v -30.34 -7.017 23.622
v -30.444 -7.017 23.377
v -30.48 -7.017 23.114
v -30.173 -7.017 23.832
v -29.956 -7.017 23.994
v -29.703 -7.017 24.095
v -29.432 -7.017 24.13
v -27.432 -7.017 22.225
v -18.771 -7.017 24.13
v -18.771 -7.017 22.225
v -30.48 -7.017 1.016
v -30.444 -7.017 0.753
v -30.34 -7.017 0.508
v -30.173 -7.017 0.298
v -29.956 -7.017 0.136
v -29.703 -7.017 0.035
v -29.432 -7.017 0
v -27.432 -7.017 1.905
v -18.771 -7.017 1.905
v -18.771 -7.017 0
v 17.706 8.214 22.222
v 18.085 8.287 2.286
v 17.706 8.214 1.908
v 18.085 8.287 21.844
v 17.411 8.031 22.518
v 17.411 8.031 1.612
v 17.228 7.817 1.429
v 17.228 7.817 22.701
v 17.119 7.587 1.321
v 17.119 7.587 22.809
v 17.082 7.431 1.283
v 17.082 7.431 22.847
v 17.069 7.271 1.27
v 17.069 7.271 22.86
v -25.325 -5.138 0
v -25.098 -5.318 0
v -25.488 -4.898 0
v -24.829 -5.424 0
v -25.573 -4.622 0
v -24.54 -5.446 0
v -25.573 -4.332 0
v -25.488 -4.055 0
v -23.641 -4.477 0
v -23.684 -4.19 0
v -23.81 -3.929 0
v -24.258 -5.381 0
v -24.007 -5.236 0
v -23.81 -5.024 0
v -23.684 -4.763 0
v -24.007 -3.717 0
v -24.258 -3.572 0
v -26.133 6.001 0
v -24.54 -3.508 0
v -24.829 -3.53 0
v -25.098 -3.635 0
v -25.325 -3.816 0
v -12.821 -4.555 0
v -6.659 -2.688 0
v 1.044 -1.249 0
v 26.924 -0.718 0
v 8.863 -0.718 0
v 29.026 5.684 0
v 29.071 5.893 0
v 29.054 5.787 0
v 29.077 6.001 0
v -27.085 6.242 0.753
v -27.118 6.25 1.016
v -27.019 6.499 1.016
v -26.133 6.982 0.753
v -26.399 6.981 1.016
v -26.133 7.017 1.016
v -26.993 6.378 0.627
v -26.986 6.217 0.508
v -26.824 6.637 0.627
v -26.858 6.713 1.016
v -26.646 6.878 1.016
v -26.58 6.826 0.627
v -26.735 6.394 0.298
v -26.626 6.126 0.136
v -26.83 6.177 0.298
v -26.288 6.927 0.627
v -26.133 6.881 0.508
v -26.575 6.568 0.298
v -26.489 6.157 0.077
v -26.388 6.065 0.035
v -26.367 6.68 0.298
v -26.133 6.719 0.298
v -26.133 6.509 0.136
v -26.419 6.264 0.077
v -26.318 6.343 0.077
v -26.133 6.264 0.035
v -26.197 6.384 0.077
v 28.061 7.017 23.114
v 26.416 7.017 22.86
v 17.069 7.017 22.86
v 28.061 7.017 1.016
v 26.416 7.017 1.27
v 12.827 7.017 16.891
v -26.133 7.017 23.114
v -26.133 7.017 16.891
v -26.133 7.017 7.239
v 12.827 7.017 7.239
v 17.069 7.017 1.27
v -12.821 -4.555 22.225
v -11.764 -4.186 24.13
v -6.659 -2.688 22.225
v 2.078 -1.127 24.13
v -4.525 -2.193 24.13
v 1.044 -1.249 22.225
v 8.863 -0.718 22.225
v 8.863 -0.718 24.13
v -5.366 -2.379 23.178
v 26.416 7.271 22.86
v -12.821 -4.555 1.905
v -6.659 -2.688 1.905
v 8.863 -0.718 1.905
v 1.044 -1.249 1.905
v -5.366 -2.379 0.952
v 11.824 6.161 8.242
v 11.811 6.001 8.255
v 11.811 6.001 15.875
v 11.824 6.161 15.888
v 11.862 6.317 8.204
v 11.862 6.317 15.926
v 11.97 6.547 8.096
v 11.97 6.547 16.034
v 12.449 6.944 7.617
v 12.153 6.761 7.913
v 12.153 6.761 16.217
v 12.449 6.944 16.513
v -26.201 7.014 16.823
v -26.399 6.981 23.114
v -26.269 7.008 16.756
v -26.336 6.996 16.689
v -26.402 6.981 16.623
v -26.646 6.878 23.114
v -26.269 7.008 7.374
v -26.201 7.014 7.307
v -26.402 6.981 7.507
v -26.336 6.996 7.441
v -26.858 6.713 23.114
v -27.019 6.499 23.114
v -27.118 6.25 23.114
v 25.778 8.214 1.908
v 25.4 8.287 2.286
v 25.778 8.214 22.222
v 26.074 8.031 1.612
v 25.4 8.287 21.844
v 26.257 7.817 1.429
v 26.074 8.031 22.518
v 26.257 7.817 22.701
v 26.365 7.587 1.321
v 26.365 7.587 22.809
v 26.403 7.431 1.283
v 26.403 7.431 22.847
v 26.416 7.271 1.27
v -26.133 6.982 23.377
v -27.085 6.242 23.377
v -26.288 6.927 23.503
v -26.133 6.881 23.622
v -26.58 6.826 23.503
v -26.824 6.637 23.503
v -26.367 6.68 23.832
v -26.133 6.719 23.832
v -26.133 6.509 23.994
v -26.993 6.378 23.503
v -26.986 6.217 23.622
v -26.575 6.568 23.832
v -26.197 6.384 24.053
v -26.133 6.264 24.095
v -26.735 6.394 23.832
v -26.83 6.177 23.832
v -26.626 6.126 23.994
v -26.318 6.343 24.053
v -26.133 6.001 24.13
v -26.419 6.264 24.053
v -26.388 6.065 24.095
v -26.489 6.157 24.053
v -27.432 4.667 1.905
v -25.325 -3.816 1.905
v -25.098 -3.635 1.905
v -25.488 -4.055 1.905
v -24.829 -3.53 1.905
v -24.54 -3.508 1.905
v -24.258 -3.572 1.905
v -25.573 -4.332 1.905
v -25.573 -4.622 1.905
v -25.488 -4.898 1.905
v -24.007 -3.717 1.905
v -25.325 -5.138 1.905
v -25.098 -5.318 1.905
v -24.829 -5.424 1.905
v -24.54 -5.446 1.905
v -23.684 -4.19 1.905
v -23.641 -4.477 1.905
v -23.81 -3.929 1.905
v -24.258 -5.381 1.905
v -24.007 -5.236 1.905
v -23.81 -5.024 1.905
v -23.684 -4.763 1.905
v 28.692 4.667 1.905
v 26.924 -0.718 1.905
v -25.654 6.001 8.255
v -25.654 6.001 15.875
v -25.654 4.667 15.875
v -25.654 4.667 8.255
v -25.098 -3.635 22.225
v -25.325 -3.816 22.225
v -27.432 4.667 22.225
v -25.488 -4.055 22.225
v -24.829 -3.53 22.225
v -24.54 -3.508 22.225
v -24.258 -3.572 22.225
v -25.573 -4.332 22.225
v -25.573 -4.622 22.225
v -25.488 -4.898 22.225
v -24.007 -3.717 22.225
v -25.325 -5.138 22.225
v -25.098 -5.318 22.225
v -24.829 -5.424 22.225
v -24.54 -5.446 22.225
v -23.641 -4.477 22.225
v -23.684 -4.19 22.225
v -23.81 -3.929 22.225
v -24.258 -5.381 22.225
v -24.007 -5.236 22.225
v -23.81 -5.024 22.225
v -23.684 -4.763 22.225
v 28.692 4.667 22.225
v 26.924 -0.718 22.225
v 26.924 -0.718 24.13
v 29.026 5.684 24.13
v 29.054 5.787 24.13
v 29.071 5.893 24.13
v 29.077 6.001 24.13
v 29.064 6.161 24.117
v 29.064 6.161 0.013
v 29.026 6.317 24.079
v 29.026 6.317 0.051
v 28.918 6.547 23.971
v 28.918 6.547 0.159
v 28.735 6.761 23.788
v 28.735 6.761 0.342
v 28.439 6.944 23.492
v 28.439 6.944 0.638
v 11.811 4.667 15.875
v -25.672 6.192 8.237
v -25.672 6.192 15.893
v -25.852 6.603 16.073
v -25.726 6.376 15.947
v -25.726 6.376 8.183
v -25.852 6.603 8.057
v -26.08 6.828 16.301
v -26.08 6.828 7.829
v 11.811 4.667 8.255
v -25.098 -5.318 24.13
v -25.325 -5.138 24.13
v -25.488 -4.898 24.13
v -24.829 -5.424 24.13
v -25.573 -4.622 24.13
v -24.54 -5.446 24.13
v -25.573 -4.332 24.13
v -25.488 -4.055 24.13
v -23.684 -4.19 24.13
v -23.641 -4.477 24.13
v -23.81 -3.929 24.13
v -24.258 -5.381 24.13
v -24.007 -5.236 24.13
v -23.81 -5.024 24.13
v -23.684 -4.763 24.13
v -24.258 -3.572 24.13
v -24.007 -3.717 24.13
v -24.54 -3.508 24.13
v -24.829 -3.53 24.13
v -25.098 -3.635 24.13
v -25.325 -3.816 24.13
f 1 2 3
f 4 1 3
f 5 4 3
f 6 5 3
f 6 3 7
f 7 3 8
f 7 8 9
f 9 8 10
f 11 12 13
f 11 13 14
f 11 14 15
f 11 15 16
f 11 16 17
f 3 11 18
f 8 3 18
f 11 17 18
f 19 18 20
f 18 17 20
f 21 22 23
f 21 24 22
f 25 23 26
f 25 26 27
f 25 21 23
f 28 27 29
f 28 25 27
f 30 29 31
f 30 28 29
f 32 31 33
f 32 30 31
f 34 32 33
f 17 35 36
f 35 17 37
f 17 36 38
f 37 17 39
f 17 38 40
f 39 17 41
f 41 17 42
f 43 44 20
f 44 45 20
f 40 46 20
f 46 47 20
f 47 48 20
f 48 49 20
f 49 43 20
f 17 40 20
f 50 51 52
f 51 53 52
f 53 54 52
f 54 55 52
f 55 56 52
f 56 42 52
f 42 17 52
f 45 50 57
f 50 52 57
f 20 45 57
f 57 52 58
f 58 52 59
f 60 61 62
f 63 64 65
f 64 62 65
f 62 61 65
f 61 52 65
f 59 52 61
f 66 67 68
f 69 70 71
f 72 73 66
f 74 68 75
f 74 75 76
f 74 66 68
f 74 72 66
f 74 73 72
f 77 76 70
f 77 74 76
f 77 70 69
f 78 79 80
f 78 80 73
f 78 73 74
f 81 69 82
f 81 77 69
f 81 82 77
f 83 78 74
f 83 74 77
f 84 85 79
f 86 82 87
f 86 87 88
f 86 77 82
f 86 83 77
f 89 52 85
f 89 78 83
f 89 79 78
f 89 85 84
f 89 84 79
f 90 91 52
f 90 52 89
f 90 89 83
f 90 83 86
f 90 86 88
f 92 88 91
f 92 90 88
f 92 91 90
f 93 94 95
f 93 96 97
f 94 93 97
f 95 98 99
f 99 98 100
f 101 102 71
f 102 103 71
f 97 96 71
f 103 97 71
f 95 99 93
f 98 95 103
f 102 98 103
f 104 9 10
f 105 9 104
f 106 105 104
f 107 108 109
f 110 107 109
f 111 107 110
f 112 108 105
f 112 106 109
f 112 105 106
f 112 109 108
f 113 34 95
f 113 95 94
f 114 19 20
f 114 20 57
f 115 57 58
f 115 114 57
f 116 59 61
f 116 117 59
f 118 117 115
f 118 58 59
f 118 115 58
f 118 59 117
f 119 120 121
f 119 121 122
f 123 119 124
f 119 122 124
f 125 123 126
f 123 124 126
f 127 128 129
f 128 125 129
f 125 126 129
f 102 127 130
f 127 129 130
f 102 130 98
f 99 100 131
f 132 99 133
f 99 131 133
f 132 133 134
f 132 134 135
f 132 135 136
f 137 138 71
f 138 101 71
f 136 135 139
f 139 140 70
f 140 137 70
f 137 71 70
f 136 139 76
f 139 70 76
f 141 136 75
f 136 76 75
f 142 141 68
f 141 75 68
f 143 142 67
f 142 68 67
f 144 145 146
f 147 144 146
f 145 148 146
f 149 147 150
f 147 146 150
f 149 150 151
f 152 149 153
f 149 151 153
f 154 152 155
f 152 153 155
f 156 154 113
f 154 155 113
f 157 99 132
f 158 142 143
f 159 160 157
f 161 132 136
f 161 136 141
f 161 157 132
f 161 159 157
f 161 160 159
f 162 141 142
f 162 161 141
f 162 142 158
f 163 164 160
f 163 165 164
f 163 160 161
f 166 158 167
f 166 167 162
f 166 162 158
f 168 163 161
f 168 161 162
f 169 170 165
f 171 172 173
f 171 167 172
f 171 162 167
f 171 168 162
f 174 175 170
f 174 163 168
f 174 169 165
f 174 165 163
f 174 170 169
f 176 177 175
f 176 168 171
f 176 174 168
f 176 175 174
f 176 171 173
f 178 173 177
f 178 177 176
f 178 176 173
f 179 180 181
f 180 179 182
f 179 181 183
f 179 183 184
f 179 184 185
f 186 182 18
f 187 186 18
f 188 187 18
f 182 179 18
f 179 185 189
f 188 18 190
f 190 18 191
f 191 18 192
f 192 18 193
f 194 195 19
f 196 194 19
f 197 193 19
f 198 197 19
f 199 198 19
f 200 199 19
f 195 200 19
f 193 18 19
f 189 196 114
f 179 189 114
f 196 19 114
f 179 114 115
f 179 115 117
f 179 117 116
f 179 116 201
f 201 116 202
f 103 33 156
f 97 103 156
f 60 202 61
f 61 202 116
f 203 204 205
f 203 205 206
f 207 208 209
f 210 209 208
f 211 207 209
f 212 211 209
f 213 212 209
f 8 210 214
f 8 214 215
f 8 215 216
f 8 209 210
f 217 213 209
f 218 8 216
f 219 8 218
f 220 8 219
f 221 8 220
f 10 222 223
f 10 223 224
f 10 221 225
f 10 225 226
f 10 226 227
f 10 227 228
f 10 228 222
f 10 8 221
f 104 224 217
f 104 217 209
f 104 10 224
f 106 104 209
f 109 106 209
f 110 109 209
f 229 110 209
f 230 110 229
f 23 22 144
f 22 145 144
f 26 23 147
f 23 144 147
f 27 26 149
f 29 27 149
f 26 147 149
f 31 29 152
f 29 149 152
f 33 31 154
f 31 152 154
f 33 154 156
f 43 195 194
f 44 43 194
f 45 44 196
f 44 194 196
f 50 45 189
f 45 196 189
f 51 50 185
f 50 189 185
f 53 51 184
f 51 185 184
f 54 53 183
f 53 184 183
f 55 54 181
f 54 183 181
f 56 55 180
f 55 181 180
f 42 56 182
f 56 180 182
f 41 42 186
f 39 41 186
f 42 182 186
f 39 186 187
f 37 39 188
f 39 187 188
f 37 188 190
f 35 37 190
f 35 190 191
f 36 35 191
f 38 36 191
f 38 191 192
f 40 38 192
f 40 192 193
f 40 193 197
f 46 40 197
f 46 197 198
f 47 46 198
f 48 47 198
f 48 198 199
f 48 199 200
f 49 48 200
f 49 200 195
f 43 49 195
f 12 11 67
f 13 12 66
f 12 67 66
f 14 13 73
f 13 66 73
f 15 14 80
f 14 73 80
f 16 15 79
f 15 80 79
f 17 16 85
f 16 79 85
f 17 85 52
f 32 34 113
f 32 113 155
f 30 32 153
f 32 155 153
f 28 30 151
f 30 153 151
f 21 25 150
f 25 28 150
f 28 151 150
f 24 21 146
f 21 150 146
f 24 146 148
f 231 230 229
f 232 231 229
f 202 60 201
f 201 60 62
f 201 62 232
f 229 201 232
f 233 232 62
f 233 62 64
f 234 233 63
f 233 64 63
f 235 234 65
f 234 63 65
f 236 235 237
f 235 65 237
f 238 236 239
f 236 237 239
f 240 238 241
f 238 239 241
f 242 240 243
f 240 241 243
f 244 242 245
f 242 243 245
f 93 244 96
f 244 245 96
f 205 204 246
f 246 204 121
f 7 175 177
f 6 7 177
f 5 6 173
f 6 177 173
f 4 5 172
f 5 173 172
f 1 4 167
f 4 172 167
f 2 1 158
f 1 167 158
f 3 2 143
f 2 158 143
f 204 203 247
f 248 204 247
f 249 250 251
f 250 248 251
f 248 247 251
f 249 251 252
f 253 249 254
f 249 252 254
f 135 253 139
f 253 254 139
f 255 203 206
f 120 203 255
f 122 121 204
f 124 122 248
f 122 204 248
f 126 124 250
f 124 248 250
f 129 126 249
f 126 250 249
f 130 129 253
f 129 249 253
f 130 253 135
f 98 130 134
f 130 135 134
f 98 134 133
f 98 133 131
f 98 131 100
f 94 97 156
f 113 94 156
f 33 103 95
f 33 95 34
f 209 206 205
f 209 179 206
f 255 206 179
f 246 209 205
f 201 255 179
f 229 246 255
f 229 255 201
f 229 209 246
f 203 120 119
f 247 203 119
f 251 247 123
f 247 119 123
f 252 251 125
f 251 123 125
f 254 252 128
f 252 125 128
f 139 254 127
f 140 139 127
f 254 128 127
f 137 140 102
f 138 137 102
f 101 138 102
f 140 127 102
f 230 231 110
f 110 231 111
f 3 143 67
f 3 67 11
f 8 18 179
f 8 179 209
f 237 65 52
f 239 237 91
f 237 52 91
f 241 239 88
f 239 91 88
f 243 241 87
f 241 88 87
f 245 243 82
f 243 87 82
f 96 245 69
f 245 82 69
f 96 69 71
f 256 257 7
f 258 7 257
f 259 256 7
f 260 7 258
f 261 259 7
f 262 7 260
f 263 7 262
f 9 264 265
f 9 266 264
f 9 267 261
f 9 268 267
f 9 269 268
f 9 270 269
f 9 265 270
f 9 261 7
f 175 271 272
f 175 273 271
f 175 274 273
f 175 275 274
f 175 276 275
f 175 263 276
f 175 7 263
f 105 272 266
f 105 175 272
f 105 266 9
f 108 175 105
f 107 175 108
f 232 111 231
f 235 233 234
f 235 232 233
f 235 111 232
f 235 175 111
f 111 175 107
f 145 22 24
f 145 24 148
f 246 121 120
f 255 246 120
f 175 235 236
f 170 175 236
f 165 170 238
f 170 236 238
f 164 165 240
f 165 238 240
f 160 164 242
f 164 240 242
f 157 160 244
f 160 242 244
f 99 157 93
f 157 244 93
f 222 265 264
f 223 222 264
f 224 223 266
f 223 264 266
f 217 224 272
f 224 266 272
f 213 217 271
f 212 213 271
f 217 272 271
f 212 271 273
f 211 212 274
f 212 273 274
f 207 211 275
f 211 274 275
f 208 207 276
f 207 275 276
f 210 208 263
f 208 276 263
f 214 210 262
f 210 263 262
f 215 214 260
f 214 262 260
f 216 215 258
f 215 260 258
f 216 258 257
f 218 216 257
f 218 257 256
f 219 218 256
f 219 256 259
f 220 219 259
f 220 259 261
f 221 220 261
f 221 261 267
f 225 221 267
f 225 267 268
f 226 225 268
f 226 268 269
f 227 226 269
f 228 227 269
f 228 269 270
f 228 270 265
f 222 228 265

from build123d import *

# Parameters (mm, degrees)
SKETCH5_W           = 53.848
SKETCH5_H           = 14.0335
SKETCH5_W_2         = 9.3472
SKETCH5_H_2         = 1.27
BOSS_EXTRUDE2_DEPTH = 24.13
SKETCH7_R           = 0.97155
CUT_EXTRUDE3_DEPTH  = 40.748679545
SKETCH8_W           = 9.3472
SKETCH8_H           = 1.27
CUT_EXTRUDE4_DEPTH  = 1.27
SKETCH9_W           = 37.465
SKETCH9_H           = 7.62
CUT_EXTRUDE5_DEPTH  = 42.33069605
SKETCH10_W          = 56.896
SKETCH10_H          = 20.32
CUT_EXTRUDE6_DEPTH  = 11.684
FILLET1_R           = 1.016
FILLET5_R           = 1.016


with BuildPart() as part:
    # Sketch5 → Boss-Extrude2 (new body)
    with BuildSketch(Plane.XY):
        Rectangle(SKETCH5_W, SKETCH5_H)
        Polygon((26.924, 7.01675), (26.924, -0.71755), (29.464, 7.01675), align=None)
        Polygon((-26.924, 7.01675), (-30.48, -7.01675), (-26.924, -7.01675), align=None)
        with Locations((21.7424, 7.65175)):
            Rectangle(SKETCH5_W_2, SKETCH5_H_2)
    extrude(amount=BOSS_EXTRUDE2_DEPTH)

    # Sketch7 → Cut-Extrude3 (cut, through all)
    with BuildSketch(Plane.XY.offset(24.13)):
        with BuildLine():
            Line((26.924, -7.01675), (26.924, -0.71755))
            Line((26.924, -0.71755), (8.862620223, -0.71755))
            add(Edge.make_bspline(
                [(-18.7706, -7.01675), (-5.778401918, -0.891302623), (8.862620223, -0.71755)],
                knots=[0, 0, 0, 1, 1, 1], degree=2))
            Line((-18.7706, -7.01675), (26.924, -7.01675))
        make_face()
        with Locations((-24.6126, -4.47675)):
            Circle(SKETCH7_R)
    extrude(amount=-CUT_EXTRUDE3_DEPTH, mode=Mode.SUBTRACT)

    # Sketch8 → Cut-Extrude4 (cut)
    with BuildSketch(Plane(origin=(0, 8.28675, 0), x_dir=(1, 0, 0), z_dir=(0, 1, 0))):
        with Locations((21.7424, -0.635)):
            Rectangle(SKETCH8_W, SKETCH8_H)
        with Locations((21.7424, -23.495)):
            Rectangle(SKETCH8_W, SKETCH8_H)
    extrude(amount=-CUT_EXTRUDE4_DEPTH, mode=Mode.SUBTRACT)

    # Sketch9 → Cut-Extrude5 (cut, through all)
    with BuildSketch(Plane(origin=(0, 7.01675, 0), x_dir=(1, 0, 0), z_dir=(0, 1, 0))):
        with Locations((-6.9215, -12.065)):
            Rectangle(SKETCH9_W, SKETCH9_H)
    extrude(amount=-CUT_EXTRUDE5_DEPTH, mode=Mode.SUBTRACT)

    # Sketch10 → Cut-Extrude6 (cut)
    with BuildSketch(Plane.XZ.offset(7.01675)):
        with Locations((1.016, 12.065)):
            Rectangle(SKETCH10_W, SKETCH10_H)
    extrude(amount=-CUT_EXTRUDE6_DEPTH, mode=Mode.SUBTRACT)

    # Fillet1
    # the kernel refuses this fillet: 1.016 mm, written as the material it takes off along each edge
    with BuildSketch(Plane(origin=(-26.133337543, 6.00075, 1.016), x_dir=(-0.9693635135141576, 0.2456305735601486, 0), z_dir=(0, 0, -1))) as fillet1_piece_1_section:
        Polygon((0, 0), (FILLET1_R, 0), (FILLET1_R, FILLET1_R * 0.778211079665), (FILLET1_R * 0.24563057356, FILLET1_R * 0.969363513514), align=None)
    fillet1_piece_1 = extrude(amount=FILLET1_R, mode=Mode.PRIVATE)
    fillet1_piece_1 = fillet1_piece_1 - Plane(origin=(-26.133337543, 6.00075, 1.016), x_dir=(0.6141536560339975, -0.7891864714882498, 0), z_dir=(0, 0, -1)) * Sphere(FILLET1_R, mode=Mode.PRIVATE)
    add(fillet1_piece_1, mode=Mode.SUBTRACT)
    with BuildSketch(Plane(origin=(-26.133337543, 6.00075, 23.114), x_dir=(-0.9693635135141576, 0.2456305735601486, 0), z_dir=(0, 0, 1))) as fillet1_piece_2_section:
        Polygon((0, 0), (FILLET1_R, 0), (FILLET1_R, -FILLET1_R * 0.778211079665), (FILLET1_R * 0.24563057356, -FILLET1_R * 0.969363513514), align=None)
    fillet1_piece_2 = extrude(amount=FILLET1_R, mode=Mode.PRIVATE)
    fillet1_piece_2 = fillet1_piece_2 - Plane(origin=(-26.133337543, 6.00075, 23.114), x_dir=(0.6141536560339975, -0.7891864714882498, 0), z_dir=(0, 0, 1)) * Sphere(FILLET1_R, mode=Mode.PRIVATE)
    add(fillet1_piece_2, mode=Mode.SUBTRACT)
    with BuildSketch(Plane(origin=(-26.924, 7.01675, 1.016), x_dir=(-0.24563057356014745, -0.969363513514158, 0), z_dir=(0, 0, 1))) as fillet1_piece_3:
        with BuildLine():
            CenterArc((FILLET1_R * 0.778211079665, FILLET1_R), FILLET1_R, 194.219101718, 75.780898282)
            Line((-FILLET1_R * 0.191152433849, FILLET1_R * 0.75436942644), (0, 0))
            Line((0, 0), (FILLET1_R * 0.778211079665, 0))
        make_face()
    extrude(amount=22.098, mode=Mode.SUBTRACT)
    with BuildSketch(Plane(origin=(29.464, 7.01675, -3.507619048), x_dir=(-0.312012480499221, -0.9500780031201245, 0), z_dir=(0, 0, 1))) as fillet1_piece_4:
        with BuildLine():
            CenterArc((FILLET1_R * 1.38095238095, -FILLET1_R), FILLET1_R, 90, 108.180553842)
            Line((FILLET1_R * 0.430874377832, -FILLET1_R * 1.3120124805), (0, 0))
            Line((0, 0), (FILLET1_R * 1.38095238095, 0))
        make_face()
    extrude(amount=31.145238095, mode=Mode.SUBTRACT)
    with BuildSketch(Plane(origin=(32.004, 7.01675, 24.13), x_dir=(0, -1, 0), z_dir=(-1, 0, 0)), Plane(origin=(-26.133337543, 7.01675, 0), x_dir=(0, -1, 0), z_dir=(1, 0, 0))) as fillet1_piece_5:
        with BuildLine():
            CenterArc((FILLET1_R, -FILLET1_R), FILLET1_R, 90, 90)
            Line((0, -FILLET1_R), (0, 0))
            Line((0, 0), (FILLET1_R, 0))
        make_face()
    extrude(amount=58.137337543, mode=Mode.SUBTRACT)
    with BuildSketch(Plane(origin=(-27.118210873, 6.250310663, 24.13), x_dir=(0.9693635135141576, -0.24563057356014859, -3.4967654318902577e-15), z_dir=(-0.2456305735601486, -0.9693635135141576, 0)), Plane(origin=(-27.118210873, 6.250310663, 0), x_dir=(0, 0, 1), z_dir=(-0.2456305735601486, -0.9693635135141576, 0))) as fillet1_piece_6:
        with BuildLine():
            CenterArc((FILLET1_R, -FILLET1_R), FILLET1_R, 90, 90)
            Line((0, -FILLET1_R), (0, 0))
            Line((0, 0), (FILLET1_R, 0))
        make_face()
    extrude(amount=16.22636273, mode=Mode.SUBTRACT)
    with BuildSketch(Plane(origin=(11.811, 7.01675, 15.875), x_dir=(1, 0, 0), z_dir=(0, 0, -1)), Plane(origin=(-25.654, 7.01675, 8.255), x_dir=(-1, 0, 0), z_dir=(0, 0, 1))) as fillet1_piece_7:
        with BuildLine():
            CenterArc((FILLET1_R, FILLET1_R), FILLET1_R, 180, 90)
            Line((0, FILLET1_R), (0, 0))
            Line((0, 0), (FILLET1_R, 0))
        make_face()
    extrude(amount=7.62, mode=Mode.SUBTRACT)
    with BuildSketch(Plane(origin=(11.811, 7.01675, 8.255), x_dir=(0, 0, -1), z_dir=(-1, 0, 0)), Plane(origin=(-25.654, 7.01675, 15.875), x_dir=(0, 0, 1), z_dir=(1, 0, 0))) as fillet1_piece_8:
        with BuildLine():
            CenterArc((FILLET1_R, FILLET1_R), FILLET1_R, 180, 90)
            Line((0, FILLET1_R), (0, 0))
            Line((0, 0), (FILLET1_R, 0))
        make_face()
    extrude(amount=37.465, mode=Mode.SUBTRACT)
    with BuildSketch(Plane(origin=(11.811, 7.01675, 18.415), x_dir=(1, 0, 0), z_dir=(0, 0, -1))) as fillet1_piece_9a_section:
        with BuildLine():
            CenterArc((FILLET1_R, FILLET1_R), FILLET1_R, 180, 90)
            Line((0, FILLET1_R), (0, 0))
            Line((0, 0), (FILLET1_R, 0))
        make_face()
    fillet1_piece_9a = extrude(amount=10.16, mode=Mode.PRIVATE)
    fillet1_piece_9a = split(fillet1_piece_9a, bisect_by=Plane(origin=(12.041017436, 6.786732564, 15.875), z_dir=(0, 0, 1)), keep=Keep.TOP, mode=Mode.PRIVATE)
    with BuildSketch(Plane(origin=(-25.654, 7.01675, 15.875), x_dir=(0, 0, 1), z_dir=(1, 0, 0))) as fillet1_piece_9b_section:
        with BuildLine():
            CenterArc((FILLET1_R, FILLET1_R), FILLET1_R, 180, 90)
            Line((0, FILLET1_R), (0, 0))
            Line((0, 0), (FILLET1_R, 0))
        make_face()
    fillet1_piece_9b = extrude(amount=40.005, mode=Mode.PRIVATE)
    fillet1_piece_9b = split(fillet1_piece_9b, bisect_by=Plane(origin=(11.811, 6.786732564, 16.105017436), z_dir=(1, 0, 0)), keep=Keep.TOP, mode=Mode.PRIVATE)
    fillet1_piece_9 = fillet1_piece_9a & fillet1_piece_9b
    add(fillet1_piece_9, mode=Mode.SUBTRACT)
    with BuildSketch(Plane(origin=(14.351, 7.01675, 8.255), x_dir=(0, 0, -1), z_dir=(-1, 0, 0))) as fillet1_piece_10a_section:
        with BuildLine():
            CenterArc((FILLET1_R, FILLET1_R), FILLET1_R, 180, 90)
            Line((0, FILLET1_R), (0, 0))
            Line((0, 0), (FILLET1_R, 0))
        make_face()
    fillet1_piece_10a = extrude(amount=40.005, mode=Mode.PRIVATE)
    fillet1_piece_10a = split(fillet1_piece_10a, bisect_by=Plane(origin=(11.811, 6.786732564, 8.024982564), z_dir=(1, 0, 0)), keep=Keep.TOP, mode=Mode.PRIVATE)
    with BuildSketch(Plane(origin=(11.811, 7.01675, 15.875), x_dir=(1, 0, 0), z_dir=(0, 0, -1))) as fillet1_piece_10b_section:
        with BuildLine():
            CenterArc((FILLET1_R, FILLET1_R), FILLET1_R, 180, 90)
            Line((0, FILLET1_R), (0, 0))
            Line((0, 0), (FILLET1_R, 0))
        make_face()
    fillet1_piece_10b = extrude(amount=10.16, mode=Mode.PRIVATE)
    fillet1_piece_10b = split(fillet1_piece_10b, bisect_by=Plane(origin=(12.041017436, 6.786732564, 8.255), z_dir=(0, 0, -1)), keep=Keep.TOP, mode=Mode.PRIVATE)
    fillet1_piece_10 = fillet1_piece_10a & fillet1_piece_10b
    add(fillet1_piece_10, mode=Mode.SUBTRACT)
    with BuildSketch(Plane(origin=(-25.654, 7.01675, 5.715), x_dir=(-1, 0, 0), z_dir=(0, 0, 1))) as fillet1_piece_11a_section:
        with BuildLine():
            CenterArc((FILLET1_R, FILLET1_R), FILLET1_R, 180, 90)
            Line((0, FILLET1_R), (0, 0))
            Line((0, 0), (FILLET1_R, 0))
        make_face()
    fillet1_piece_11a = extrude(amount=10.16, mode=Mode.PRIVATE)
    fillet1_piece_11a = split(fillet1_piece_11a, bisect_by=Plane(origin=(-25.884017436, 6.786732564, 8.255), z_dir=(0, 0, -1)), keep=Keep.TOP, mode=Mode.PRIVATE)
    with BuildSketch(Plane(origin=(11.811, 7.01675, 8.255), x_dir=(0, 0, -1), z_dir=(-1, 0, 0))) as fillet1_piece_11b_section:
        with BuildLine():
            CenterArc((FILLET1_R, FILLET1_R), FILLET1_R, 180, 90)
            Line((0, FILLET1_R), (0, 0))
            Line((0, 0), (FILLET1_R, 0))
        make_face()
    fillet1_piece_11b = extrude(amount=40.005, mode=Mode.PRIVATE)
    fillet1_piece_11b = split(fillet1_piece_11b, bisect_by=Plane(origin=(-25.654, 6.786732564, 8.024982564), z_dir=(-1, 0, 0)), keep=Keep.TOP, mode=Mode.PRIVATE)
    fillet1_piece_11 = fillet1_piece_11a & fillet1_piece_11b
    add(fillet1_piece_11, mode=Mode.SUBTRACT)
    with BuildSketch(Plane(origin=(-25.654, 7.01675, 8.255), x_dir=(-1, 0, 0), z_dir=(0, 0, 1))) as fillet1_piece_12a_section:
        with BuildLine():
            CenterArc((FILLET1_R, FILLET1_R), FILLET1_R, 180, 90)
            Line((0, FILLET1_R), (0, 0))
            Line((0, 0), (FILLET1_R, 0))
        make_face()
    fillet1_piece_12a = extrude(amount=10.16, mode=Mode.PRIVATE)
    fillet1_piece_12a = split(fillet1_piece_12a, bisect_by=Plane(origin=(-25.884017436, 6.786732564, 15.875), z_dir=(0, 0, 1)), keep=Keep.TOP, mode=Mode.PRIVATE)
    with BuildSketch(Plane(origin=(-28.194, 7.01675, 15.875), x_dir=(0, 0, 1), z_dir=(1, 0, 0))) as fillet1_piece_12b_section:
        with BuildLine():
            CenterArc((FILLET1_R, FILLET1_R), FILLET1_R, 180, 90)
            Line((0, FILLET1_R), (0, 0))
            Line((0, 0), (FILLET1_R, 0))
        make_face()
    fillet1_piece_12b = extrude(amount=40.005, mode=Mode.PRIVATE)
    fillet1_piece_12b = split(fillet1_piece_12b, bisect_by=Plane(origin=(-25.654, 6.786732564, 16.105017436), z_dir=(-1, 0, 0)), keep=Keep.TOP, mode=Mode.PRIVATE)
    fillet1_piece_12 = fillet1_piece_12a & fillet1_piece_12b
    add(fillet1_piece_12, mode=Mode.SUBTRACT)

    # Fillet5
    fillet5_edges = [part.edges().sort_by_distance(p)[0] for p in [
        (26.416, 8.28675, 12.065),
        (17.0688, 8.28675, 12.065),
        (21.7424, 8.28675, 1.27),
        (21.7424, 8.28675, 22.86),
    ]]
    fillet(fillet5_edges, radius=FILLET5_R)


solid = part.part
